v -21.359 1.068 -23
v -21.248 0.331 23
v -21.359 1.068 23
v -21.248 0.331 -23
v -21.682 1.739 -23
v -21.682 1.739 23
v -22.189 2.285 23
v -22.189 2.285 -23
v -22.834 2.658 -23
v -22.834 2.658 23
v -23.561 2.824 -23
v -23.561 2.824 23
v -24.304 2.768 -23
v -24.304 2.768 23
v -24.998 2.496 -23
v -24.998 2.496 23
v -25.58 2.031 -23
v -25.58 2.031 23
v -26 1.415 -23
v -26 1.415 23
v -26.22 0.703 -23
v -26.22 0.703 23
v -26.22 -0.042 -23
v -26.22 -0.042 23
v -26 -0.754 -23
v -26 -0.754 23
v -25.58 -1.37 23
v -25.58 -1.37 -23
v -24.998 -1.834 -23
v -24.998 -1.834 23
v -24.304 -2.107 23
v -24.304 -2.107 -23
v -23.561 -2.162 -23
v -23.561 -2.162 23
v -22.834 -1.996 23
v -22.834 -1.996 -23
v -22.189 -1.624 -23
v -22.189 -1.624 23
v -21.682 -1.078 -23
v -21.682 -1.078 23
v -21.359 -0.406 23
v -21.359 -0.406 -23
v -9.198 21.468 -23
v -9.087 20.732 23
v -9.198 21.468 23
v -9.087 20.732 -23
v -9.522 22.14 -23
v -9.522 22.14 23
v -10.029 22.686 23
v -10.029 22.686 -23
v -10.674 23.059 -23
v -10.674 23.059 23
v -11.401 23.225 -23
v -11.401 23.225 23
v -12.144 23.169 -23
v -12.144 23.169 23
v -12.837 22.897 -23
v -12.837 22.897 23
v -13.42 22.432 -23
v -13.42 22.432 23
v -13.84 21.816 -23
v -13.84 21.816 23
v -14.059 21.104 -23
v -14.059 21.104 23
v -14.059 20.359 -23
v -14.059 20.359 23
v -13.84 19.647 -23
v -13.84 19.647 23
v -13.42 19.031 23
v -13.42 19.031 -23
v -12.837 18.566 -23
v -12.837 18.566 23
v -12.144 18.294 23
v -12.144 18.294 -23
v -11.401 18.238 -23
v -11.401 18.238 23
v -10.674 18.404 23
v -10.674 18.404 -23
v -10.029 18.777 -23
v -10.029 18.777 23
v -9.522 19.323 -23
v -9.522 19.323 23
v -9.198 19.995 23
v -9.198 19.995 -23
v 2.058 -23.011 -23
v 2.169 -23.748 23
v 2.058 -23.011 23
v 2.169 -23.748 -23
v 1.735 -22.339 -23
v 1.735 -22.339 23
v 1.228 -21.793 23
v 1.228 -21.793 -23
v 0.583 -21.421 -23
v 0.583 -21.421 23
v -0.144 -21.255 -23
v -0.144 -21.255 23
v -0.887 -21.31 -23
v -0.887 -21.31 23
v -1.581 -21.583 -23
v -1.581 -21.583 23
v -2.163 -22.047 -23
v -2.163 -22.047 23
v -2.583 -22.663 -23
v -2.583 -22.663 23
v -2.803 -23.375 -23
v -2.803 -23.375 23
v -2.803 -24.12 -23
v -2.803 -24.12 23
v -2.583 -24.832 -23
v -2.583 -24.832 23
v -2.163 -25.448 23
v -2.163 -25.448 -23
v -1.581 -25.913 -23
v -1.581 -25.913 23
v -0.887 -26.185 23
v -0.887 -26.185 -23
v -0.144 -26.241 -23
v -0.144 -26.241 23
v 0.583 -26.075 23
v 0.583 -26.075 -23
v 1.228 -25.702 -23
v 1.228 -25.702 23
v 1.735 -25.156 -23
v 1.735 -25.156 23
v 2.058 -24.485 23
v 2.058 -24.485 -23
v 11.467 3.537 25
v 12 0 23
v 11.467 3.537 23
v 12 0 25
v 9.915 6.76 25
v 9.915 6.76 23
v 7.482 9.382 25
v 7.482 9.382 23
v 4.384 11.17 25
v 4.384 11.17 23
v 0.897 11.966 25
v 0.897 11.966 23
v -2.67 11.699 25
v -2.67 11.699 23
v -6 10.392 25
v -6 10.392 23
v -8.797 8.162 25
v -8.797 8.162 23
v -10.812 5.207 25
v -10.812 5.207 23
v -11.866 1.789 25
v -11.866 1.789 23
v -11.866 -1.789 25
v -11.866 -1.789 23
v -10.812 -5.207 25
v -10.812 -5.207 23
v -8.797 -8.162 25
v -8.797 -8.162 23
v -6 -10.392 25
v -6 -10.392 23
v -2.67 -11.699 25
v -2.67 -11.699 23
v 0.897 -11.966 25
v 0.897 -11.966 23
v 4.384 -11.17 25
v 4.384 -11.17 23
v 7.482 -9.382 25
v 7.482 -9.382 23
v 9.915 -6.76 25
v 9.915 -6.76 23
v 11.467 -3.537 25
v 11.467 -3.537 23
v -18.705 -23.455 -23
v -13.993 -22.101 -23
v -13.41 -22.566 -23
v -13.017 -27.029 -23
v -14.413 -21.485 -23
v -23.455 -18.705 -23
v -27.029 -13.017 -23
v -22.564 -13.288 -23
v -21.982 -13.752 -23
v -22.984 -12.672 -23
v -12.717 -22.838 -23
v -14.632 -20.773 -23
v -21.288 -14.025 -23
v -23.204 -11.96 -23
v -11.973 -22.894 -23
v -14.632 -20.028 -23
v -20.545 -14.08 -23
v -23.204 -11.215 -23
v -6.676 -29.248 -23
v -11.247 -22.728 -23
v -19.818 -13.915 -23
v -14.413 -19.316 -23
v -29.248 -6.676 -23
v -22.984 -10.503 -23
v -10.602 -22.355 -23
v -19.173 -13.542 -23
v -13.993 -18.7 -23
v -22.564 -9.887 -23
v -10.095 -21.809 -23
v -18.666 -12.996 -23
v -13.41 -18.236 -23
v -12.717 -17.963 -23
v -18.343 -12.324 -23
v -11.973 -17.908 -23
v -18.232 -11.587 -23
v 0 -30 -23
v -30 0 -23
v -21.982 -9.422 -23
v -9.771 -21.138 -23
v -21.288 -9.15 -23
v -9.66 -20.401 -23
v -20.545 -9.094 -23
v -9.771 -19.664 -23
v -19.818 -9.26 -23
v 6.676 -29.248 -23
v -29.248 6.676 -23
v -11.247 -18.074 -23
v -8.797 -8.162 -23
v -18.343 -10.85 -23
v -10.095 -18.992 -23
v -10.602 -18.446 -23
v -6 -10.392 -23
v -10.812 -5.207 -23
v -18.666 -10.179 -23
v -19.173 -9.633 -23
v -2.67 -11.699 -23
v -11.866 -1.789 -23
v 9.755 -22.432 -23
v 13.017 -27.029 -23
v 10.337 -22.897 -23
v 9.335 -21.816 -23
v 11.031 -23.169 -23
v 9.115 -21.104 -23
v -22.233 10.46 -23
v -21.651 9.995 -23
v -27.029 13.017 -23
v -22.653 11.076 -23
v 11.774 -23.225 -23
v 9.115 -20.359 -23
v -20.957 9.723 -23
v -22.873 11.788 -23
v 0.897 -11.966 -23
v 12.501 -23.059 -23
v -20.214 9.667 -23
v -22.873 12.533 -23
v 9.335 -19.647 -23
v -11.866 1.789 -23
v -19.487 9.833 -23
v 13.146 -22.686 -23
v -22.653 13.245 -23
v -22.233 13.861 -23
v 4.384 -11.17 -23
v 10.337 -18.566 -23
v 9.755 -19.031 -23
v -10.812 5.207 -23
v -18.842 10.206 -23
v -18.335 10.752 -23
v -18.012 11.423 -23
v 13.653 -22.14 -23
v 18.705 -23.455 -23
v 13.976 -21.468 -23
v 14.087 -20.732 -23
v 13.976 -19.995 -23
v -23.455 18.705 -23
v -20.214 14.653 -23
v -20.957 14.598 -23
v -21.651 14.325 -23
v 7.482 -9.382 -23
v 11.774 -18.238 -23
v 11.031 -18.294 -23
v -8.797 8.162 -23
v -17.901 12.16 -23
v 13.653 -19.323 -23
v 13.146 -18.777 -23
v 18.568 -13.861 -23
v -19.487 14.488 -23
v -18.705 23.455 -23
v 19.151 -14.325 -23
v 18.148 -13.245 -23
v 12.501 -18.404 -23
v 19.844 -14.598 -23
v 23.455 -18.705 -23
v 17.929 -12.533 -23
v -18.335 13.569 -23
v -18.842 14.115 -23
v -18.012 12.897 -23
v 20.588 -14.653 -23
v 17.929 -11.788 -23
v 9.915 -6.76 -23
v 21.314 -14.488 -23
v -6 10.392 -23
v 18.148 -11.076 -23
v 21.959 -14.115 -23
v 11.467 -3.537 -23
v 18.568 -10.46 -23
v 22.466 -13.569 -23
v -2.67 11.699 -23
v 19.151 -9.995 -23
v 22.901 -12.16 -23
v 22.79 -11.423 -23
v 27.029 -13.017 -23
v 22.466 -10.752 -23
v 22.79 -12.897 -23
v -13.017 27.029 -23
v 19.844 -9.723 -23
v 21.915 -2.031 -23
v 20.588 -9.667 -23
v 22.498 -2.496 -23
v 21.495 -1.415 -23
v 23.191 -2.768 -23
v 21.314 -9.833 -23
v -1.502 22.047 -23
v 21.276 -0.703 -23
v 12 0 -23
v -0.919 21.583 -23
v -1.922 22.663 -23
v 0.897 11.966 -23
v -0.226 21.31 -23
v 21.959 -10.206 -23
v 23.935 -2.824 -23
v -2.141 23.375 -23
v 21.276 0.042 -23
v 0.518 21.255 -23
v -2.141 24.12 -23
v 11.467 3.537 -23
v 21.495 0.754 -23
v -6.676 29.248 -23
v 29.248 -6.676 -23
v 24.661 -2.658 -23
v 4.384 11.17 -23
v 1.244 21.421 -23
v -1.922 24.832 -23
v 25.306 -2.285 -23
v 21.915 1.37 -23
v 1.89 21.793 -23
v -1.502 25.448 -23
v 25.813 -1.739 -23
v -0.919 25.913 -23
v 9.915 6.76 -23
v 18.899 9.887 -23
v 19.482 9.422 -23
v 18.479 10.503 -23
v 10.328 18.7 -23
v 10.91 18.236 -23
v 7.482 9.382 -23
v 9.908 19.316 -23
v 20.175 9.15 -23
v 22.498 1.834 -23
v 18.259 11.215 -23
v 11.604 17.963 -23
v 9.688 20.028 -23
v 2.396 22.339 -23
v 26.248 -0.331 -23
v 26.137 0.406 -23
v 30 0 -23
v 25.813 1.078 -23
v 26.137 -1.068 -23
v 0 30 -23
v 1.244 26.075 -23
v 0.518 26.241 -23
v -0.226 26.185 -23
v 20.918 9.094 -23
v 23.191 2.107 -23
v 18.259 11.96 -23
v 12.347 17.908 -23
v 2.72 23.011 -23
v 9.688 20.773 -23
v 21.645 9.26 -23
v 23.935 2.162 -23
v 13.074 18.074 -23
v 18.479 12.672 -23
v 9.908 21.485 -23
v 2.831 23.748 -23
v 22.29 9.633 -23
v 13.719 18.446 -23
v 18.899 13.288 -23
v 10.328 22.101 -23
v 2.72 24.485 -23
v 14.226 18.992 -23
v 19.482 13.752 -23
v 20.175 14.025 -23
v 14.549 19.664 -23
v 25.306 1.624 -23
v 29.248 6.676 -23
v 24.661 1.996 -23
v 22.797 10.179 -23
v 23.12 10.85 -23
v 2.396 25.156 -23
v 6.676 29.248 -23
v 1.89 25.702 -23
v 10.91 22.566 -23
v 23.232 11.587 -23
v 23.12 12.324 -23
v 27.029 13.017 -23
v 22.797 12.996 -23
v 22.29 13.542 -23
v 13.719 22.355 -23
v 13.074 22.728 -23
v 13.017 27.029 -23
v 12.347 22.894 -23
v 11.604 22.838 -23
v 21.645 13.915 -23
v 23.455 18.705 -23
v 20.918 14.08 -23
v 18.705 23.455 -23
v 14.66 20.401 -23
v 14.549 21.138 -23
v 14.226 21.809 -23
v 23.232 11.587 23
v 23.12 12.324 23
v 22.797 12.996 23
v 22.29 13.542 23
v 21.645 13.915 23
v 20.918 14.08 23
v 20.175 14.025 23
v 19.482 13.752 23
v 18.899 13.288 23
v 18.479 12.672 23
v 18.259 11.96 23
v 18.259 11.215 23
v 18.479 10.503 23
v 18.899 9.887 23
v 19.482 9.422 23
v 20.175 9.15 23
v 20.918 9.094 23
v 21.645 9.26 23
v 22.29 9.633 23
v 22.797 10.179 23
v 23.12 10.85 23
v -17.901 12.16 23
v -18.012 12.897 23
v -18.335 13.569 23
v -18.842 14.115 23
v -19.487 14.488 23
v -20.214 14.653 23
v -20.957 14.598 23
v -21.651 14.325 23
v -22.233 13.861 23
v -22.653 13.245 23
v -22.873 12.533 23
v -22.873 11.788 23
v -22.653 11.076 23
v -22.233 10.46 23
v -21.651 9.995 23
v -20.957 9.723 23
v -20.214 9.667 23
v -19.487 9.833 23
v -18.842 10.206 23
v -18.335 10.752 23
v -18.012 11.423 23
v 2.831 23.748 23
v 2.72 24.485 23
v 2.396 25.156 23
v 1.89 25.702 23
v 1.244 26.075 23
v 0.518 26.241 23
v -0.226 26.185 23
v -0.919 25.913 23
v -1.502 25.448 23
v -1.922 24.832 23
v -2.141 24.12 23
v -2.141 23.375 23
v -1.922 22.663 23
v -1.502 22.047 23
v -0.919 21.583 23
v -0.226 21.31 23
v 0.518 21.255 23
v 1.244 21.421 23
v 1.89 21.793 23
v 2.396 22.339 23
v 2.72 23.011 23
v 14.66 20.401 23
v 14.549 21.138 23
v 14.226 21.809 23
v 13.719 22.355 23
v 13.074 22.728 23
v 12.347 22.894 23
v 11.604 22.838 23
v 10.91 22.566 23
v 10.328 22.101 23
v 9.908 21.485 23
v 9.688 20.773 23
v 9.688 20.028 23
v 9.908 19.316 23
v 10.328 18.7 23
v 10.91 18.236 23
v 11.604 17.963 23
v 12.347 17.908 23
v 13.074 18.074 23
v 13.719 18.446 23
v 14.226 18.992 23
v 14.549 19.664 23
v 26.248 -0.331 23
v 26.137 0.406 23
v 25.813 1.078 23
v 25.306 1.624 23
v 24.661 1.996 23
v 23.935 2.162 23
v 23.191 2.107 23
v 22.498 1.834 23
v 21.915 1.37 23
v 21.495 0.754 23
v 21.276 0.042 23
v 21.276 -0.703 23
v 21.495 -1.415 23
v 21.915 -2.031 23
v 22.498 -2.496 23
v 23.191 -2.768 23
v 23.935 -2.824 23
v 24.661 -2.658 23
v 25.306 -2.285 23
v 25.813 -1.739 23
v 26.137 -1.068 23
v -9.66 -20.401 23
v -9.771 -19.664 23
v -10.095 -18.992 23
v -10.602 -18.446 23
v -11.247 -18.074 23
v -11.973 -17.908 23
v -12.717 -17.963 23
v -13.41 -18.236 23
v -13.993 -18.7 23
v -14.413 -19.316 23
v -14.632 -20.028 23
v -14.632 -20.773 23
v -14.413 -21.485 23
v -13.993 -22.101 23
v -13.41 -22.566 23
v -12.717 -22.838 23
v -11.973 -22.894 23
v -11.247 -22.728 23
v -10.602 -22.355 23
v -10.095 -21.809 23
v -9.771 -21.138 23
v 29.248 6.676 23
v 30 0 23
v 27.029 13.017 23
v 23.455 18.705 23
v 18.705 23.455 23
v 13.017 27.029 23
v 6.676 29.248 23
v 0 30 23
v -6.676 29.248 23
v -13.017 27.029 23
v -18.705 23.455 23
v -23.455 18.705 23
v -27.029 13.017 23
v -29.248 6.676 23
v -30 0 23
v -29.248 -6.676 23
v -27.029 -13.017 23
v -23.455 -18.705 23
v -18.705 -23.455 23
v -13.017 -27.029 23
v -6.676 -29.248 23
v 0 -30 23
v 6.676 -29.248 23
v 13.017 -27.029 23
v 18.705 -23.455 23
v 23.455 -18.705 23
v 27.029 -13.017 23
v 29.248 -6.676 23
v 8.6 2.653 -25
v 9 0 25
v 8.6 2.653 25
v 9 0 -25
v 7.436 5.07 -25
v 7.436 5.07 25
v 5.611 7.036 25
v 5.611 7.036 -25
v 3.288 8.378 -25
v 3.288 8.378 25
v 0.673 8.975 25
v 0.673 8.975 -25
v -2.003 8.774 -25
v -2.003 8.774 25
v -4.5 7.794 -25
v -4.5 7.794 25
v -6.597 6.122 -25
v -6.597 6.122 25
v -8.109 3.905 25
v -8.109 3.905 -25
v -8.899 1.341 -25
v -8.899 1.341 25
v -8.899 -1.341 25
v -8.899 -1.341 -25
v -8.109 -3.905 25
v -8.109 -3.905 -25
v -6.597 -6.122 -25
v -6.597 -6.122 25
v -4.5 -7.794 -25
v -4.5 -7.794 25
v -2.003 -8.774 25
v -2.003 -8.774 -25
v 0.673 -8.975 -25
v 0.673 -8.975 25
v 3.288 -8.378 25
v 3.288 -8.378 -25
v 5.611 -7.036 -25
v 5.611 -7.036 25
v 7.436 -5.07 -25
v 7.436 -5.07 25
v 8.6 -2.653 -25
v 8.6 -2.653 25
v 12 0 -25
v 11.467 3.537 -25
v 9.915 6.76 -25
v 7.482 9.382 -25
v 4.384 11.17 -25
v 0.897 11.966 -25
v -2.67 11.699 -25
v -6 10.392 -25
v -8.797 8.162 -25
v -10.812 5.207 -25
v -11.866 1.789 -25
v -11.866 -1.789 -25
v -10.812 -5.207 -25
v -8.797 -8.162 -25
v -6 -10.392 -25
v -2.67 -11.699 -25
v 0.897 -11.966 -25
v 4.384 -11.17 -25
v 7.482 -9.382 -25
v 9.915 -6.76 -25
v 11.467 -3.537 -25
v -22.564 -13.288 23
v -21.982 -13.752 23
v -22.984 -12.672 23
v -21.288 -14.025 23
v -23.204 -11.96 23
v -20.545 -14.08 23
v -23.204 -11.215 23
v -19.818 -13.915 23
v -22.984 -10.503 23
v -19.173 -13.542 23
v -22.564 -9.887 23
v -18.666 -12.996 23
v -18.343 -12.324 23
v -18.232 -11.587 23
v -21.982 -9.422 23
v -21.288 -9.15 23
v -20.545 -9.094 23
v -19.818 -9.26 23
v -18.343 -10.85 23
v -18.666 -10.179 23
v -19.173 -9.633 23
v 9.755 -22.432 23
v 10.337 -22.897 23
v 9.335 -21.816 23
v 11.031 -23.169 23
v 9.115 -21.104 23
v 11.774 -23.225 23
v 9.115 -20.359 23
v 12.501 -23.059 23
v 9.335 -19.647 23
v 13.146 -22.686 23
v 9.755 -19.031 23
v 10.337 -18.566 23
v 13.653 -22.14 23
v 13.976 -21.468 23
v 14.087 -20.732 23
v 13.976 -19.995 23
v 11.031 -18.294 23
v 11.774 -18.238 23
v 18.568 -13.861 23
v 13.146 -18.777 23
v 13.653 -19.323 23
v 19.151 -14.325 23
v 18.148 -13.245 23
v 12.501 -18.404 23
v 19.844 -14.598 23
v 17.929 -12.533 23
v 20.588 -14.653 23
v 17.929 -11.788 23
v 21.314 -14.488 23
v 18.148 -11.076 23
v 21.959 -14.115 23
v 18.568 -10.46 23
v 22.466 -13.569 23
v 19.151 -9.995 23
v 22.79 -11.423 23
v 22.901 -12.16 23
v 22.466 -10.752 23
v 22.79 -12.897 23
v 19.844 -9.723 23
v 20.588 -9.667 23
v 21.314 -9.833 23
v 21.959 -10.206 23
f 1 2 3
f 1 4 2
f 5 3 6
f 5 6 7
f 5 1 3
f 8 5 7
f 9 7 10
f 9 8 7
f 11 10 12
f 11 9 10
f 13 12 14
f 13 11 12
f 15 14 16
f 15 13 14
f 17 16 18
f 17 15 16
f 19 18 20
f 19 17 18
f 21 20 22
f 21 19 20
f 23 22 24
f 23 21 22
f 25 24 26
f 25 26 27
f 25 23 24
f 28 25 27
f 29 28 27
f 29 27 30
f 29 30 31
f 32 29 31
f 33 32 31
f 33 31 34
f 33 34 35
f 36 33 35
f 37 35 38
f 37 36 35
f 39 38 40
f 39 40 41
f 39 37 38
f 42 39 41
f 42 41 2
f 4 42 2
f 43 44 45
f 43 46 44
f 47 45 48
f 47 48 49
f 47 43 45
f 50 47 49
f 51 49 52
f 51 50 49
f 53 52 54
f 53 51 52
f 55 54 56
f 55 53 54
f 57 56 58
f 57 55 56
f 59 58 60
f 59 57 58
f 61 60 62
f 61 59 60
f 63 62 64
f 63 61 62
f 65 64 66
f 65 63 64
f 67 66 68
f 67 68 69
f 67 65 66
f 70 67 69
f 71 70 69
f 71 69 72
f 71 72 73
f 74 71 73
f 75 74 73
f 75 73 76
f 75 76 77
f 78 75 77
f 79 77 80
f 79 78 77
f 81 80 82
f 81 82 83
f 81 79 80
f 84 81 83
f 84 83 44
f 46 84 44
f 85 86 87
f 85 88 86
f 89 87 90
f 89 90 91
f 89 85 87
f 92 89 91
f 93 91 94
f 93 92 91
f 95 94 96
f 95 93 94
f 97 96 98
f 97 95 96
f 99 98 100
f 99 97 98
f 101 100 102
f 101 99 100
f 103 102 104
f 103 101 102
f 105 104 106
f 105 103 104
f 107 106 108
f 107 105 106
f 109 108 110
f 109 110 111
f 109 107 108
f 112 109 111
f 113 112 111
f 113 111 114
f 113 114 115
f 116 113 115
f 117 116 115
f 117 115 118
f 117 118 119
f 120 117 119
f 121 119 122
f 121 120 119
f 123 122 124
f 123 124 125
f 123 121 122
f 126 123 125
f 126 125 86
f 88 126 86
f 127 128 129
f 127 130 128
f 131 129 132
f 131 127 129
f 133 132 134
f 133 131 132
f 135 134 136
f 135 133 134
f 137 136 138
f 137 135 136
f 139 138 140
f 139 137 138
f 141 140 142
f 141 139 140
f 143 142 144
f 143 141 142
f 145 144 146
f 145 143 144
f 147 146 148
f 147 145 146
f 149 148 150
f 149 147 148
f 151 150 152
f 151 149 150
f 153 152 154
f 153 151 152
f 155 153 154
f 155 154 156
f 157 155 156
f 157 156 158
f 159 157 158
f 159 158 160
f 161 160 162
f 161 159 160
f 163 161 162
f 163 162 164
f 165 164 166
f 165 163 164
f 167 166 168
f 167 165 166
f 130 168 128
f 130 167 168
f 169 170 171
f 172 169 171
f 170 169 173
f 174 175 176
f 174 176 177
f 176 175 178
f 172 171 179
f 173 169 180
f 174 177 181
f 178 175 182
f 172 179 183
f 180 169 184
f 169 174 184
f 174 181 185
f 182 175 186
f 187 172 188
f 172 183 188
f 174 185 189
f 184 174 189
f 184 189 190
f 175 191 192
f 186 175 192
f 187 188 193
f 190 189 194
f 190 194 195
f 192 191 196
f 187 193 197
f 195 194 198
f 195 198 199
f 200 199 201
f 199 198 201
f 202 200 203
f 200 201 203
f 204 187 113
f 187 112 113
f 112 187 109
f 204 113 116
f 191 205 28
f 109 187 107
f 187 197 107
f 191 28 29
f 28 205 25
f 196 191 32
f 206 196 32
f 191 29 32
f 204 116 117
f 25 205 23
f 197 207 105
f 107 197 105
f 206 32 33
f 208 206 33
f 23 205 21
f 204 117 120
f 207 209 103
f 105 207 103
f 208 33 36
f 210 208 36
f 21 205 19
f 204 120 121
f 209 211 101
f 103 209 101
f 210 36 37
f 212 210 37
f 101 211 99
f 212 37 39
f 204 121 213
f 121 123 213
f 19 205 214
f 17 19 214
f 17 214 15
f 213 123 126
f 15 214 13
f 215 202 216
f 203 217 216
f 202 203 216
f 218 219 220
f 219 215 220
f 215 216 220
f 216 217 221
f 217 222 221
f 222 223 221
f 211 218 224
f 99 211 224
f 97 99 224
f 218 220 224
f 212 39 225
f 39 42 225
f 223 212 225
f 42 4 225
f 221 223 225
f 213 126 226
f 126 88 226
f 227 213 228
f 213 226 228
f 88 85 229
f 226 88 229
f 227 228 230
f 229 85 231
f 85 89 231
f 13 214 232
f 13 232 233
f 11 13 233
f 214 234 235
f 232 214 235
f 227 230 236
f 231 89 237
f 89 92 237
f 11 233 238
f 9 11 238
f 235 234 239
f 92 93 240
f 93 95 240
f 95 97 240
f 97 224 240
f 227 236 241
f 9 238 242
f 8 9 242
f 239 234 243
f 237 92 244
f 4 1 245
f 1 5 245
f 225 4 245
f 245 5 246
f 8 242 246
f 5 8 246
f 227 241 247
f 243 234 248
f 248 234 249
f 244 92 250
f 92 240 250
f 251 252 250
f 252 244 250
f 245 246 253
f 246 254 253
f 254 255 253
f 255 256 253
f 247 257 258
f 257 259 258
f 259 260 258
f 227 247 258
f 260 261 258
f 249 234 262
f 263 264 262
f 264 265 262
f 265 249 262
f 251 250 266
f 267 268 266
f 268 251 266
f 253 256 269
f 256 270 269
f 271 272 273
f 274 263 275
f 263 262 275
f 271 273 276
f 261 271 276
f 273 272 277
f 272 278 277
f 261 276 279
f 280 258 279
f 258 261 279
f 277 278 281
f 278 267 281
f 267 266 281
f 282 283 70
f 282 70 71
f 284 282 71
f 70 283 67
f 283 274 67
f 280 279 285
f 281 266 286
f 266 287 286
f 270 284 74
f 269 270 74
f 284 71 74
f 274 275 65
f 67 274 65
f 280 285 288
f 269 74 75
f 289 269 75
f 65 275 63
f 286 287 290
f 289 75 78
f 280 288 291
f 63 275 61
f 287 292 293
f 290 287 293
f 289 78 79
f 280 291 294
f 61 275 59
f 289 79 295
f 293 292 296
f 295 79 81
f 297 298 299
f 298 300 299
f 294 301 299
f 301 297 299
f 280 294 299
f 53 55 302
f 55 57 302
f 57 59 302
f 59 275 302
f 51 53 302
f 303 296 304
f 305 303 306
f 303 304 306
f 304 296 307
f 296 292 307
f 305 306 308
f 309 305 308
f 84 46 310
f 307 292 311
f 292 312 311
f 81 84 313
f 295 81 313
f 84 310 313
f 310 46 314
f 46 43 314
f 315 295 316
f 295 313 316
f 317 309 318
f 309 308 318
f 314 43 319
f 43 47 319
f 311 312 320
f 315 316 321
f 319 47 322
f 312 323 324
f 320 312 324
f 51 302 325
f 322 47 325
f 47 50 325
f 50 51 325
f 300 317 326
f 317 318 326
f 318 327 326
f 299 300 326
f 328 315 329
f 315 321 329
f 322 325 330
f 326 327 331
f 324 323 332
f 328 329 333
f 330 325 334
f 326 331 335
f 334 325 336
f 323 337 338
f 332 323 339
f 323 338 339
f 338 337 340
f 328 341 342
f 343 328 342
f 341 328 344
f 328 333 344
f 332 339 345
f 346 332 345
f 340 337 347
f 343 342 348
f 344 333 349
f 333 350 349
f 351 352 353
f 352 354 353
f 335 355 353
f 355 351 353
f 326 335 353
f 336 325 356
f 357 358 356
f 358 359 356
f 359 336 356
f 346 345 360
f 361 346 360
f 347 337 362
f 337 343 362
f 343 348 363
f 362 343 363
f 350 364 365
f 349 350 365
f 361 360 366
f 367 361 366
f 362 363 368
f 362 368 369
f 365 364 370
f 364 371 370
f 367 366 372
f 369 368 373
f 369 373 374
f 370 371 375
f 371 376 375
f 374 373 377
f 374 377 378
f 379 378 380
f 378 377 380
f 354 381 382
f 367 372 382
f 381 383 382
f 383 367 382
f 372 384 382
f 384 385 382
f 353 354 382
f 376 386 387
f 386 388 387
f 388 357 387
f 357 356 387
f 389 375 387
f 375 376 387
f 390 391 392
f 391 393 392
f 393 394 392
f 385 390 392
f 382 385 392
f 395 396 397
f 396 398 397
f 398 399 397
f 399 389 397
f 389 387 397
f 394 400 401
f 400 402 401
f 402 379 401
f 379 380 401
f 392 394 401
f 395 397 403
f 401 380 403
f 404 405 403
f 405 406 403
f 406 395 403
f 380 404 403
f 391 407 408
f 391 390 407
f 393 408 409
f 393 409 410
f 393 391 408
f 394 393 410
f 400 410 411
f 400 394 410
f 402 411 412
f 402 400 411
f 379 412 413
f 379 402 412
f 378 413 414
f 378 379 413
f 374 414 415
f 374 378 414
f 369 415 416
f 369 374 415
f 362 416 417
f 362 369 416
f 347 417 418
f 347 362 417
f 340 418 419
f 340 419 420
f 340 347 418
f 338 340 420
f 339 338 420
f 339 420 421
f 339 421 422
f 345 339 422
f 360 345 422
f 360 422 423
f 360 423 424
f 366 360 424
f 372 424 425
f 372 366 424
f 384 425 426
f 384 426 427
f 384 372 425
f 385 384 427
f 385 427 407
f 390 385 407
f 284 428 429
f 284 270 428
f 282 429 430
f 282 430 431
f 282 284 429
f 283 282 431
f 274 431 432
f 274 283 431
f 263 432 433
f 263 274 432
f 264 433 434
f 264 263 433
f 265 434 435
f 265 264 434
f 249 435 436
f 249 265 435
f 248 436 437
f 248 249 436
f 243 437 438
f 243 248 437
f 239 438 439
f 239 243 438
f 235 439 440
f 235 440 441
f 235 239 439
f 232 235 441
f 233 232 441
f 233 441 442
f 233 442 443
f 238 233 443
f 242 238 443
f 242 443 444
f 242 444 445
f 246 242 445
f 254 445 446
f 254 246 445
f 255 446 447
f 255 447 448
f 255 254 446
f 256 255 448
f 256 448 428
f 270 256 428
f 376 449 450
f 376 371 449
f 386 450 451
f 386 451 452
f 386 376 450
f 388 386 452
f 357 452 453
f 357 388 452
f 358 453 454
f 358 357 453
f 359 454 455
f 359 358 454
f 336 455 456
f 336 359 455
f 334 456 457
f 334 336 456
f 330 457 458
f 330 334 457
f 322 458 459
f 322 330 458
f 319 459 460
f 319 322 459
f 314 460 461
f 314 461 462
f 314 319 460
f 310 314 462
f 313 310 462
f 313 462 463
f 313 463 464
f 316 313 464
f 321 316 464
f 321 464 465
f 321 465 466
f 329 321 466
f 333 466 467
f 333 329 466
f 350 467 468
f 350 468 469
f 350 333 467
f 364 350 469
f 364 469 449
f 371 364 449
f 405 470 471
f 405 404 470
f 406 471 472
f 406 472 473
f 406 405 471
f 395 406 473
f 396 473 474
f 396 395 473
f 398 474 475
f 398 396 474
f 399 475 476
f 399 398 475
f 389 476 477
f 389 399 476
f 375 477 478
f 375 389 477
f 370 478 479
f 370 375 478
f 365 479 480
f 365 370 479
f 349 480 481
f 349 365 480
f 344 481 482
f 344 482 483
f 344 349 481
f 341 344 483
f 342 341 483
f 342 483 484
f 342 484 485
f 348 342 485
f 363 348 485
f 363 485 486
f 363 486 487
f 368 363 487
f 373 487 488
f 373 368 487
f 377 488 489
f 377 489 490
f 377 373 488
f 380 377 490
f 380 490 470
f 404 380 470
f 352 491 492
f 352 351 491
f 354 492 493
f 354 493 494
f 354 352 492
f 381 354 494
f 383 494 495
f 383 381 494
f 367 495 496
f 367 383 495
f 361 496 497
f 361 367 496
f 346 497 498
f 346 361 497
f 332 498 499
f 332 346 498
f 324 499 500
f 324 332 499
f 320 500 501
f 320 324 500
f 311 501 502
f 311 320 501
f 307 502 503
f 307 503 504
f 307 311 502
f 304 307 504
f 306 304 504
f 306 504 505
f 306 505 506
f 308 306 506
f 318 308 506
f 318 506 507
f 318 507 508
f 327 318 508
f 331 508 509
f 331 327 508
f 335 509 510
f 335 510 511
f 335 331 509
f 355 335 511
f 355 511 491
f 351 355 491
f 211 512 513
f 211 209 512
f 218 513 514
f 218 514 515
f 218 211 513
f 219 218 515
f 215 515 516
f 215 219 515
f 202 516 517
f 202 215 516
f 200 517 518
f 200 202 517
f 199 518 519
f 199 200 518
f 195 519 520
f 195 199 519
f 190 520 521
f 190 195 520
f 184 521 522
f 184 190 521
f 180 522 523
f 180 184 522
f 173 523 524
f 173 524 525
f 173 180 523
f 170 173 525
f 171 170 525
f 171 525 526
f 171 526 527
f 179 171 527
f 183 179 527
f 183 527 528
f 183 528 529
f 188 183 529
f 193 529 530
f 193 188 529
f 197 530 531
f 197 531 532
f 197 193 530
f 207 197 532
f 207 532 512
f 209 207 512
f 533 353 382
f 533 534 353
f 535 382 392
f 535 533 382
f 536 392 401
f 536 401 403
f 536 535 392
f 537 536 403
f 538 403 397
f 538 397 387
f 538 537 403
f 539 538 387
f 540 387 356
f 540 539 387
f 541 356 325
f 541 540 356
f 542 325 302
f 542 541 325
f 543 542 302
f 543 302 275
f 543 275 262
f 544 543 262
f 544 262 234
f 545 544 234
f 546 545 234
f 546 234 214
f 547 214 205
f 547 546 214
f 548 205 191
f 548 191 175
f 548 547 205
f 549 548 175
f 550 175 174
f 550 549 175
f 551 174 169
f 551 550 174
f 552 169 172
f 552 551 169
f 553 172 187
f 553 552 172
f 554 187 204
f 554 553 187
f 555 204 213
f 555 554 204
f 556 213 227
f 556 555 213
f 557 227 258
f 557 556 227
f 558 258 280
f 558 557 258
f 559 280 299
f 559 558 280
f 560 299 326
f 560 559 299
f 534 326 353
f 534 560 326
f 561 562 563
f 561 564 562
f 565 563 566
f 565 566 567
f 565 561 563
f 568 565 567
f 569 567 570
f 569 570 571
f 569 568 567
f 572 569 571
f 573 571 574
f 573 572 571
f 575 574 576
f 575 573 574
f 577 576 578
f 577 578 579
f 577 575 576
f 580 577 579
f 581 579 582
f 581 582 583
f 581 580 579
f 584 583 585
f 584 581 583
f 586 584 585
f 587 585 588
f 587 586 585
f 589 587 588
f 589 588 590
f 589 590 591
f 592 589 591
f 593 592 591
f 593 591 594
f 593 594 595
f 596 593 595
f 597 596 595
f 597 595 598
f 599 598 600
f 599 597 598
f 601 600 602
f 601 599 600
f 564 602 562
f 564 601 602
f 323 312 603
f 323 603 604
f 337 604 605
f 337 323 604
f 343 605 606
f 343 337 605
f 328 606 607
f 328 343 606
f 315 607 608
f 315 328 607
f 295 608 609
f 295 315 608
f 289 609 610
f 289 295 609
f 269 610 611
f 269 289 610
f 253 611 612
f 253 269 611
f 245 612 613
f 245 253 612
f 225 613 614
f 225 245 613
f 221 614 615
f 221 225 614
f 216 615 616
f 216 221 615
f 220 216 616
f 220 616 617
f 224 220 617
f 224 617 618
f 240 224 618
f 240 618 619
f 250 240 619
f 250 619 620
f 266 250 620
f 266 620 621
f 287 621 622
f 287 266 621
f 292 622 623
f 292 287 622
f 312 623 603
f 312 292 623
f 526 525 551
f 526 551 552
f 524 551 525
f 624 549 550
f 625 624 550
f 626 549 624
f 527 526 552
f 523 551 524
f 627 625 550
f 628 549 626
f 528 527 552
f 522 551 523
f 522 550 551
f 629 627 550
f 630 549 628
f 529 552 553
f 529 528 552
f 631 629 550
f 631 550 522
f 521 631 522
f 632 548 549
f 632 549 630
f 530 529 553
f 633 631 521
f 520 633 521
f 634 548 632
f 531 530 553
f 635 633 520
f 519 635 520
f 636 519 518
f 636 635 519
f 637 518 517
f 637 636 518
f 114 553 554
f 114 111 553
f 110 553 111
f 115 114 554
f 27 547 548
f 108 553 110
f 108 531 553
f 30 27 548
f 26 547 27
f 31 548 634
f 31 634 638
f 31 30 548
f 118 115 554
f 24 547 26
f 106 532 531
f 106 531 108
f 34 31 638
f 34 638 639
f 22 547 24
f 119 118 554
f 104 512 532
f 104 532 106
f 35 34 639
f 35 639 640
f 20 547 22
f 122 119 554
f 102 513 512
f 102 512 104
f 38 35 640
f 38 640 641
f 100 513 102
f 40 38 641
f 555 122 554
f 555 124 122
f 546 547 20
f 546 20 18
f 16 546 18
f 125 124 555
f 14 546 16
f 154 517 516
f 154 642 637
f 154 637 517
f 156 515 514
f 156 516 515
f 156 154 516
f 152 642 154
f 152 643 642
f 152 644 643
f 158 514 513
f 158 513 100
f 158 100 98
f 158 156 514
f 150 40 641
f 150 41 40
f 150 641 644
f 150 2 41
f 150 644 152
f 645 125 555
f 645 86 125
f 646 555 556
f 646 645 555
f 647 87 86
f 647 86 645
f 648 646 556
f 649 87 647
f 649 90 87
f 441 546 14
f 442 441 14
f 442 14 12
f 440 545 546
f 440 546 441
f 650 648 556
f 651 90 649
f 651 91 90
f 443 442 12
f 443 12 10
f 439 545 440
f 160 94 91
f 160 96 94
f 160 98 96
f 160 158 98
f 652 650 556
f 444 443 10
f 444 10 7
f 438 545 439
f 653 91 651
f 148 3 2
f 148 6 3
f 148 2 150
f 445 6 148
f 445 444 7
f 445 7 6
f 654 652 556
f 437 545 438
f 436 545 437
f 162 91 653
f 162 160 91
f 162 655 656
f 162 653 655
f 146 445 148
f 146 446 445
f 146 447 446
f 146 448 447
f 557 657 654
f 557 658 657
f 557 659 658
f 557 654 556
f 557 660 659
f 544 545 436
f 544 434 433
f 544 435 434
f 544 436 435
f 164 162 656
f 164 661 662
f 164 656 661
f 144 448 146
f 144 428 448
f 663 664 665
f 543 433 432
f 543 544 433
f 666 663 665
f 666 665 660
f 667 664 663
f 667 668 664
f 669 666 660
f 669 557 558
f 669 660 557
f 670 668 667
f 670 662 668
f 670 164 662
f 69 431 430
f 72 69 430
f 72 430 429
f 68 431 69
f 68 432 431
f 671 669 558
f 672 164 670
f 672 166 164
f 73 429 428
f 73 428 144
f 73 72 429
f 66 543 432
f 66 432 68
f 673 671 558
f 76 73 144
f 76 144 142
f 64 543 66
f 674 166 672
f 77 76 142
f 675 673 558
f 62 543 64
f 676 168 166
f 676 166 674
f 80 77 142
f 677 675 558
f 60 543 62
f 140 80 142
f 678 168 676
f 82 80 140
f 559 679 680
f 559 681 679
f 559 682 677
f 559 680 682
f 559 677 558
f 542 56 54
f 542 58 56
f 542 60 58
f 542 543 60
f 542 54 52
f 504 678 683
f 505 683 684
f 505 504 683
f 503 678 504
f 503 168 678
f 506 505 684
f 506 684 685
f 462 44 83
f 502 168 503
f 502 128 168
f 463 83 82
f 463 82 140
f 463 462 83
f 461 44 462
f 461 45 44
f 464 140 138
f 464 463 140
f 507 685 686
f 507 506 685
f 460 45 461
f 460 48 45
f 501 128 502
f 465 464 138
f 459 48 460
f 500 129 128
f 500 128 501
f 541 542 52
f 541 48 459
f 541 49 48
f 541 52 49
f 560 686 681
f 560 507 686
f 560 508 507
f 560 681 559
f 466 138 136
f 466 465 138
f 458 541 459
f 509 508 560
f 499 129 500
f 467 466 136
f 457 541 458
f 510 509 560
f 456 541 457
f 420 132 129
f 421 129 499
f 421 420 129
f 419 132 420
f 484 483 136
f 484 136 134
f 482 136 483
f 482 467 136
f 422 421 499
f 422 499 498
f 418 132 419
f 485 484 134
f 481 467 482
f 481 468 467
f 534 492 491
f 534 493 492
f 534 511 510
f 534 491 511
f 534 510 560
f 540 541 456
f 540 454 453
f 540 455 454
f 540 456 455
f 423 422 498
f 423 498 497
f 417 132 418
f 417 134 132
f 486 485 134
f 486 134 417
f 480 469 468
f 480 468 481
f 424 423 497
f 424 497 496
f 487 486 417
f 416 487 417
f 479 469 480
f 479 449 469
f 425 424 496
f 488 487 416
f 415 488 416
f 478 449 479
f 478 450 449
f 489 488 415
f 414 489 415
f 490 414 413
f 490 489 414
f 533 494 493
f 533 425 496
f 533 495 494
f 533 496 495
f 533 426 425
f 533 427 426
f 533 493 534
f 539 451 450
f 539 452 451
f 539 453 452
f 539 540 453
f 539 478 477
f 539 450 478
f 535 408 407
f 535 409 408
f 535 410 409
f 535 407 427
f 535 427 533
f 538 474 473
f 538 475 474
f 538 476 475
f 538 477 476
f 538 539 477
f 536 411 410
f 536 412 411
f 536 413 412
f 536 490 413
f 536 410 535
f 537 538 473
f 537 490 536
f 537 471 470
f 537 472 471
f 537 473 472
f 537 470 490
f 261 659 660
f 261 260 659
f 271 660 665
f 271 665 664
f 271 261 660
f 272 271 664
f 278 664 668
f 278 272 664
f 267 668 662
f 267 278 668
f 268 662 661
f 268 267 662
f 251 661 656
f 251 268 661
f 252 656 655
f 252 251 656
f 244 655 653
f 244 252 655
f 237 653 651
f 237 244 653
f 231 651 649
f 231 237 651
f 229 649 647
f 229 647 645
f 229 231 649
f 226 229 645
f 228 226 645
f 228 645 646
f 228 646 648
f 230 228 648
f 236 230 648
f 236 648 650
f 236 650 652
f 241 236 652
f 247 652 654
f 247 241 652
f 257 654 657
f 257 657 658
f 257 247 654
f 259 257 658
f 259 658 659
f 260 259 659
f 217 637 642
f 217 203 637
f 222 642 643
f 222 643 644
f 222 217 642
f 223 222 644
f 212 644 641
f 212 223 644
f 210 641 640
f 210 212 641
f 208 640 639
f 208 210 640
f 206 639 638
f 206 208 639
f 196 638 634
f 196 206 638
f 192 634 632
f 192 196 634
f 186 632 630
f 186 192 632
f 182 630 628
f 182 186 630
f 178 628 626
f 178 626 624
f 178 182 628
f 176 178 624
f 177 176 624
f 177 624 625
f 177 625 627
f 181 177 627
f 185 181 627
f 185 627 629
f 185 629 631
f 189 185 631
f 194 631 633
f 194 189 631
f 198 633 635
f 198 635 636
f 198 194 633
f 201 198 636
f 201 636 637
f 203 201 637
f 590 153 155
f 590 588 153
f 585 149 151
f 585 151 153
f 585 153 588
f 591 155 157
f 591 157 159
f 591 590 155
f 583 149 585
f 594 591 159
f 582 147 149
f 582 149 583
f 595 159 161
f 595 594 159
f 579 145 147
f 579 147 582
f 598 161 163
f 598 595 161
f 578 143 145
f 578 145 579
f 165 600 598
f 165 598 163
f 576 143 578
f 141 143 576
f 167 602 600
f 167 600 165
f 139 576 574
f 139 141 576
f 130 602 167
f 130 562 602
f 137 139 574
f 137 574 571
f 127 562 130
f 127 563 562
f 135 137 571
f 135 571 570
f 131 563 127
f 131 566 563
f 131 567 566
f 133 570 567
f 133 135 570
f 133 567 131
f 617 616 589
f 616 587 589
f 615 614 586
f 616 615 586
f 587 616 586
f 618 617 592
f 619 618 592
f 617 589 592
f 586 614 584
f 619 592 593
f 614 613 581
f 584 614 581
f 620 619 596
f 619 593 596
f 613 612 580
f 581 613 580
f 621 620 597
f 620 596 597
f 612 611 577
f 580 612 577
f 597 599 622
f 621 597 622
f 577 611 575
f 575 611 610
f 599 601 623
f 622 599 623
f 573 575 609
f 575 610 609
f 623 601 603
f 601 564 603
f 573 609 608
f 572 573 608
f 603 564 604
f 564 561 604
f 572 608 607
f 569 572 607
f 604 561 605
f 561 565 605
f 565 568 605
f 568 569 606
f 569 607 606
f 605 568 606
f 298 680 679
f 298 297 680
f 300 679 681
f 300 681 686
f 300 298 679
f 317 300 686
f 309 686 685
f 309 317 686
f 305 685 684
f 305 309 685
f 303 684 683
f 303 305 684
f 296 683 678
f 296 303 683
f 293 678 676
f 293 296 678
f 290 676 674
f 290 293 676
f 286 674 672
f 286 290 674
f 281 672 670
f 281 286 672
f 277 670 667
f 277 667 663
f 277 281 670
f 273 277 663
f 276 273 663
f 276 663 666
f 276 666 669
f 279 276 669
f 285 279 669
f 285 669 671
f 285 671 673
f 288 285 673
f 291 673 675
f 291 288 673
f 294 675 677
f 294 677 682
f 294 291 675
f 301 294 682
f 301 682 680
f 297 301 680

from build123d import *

# Parameters (mm, degrees)
SKETCH1_R           = 30
SKETCH1_R_2         = 12
SKETCH1_R_3         = 2.5
BOSS_EXTRUDE1_DEPTH = 23
SKETCH2_R           = 12
SKETCH2_R_2         = 9
BOSS_EXTRUDE2_DEPTH = 25


with BuildPart() as part:
    # Sketch1 → Boss-Extrude1 (new body, symmetric)
    with BuildSketch(Plane.XY):
        Circle(SKETCH1_R)
        Circle(SKETCH1_R_2, mode=Mode.SUBTRACT)
        with Locations((0.330787081, 23.747696307)):
            Circle(SKETCH1_R_3, mode=Mode.SUBTRACT)
        with Locations((12.160318169, 20.400714743)):
            Circle(SKETCH1_R_3, mode=Mode.SUBTRACT)
        with Locations((20.731501824, 11.587378139)):
            Circle(SKETCH1_R_3, mode=Mode.SUBTRACT)
        with Locations((23.747696307, -0.330787081)):
            Circle(SKETCH1_R_3, mode=Mode.SUBTRACT)
        with Locations((20.400714743, -12.160318169)):
            Circle(SKETCH1_R_3, mode=Mode.SUBTRACT)
        with Locations((11.587378139, -20.731501824)):
            Circle(SKETCH1_R_3, mode=Mode.SUBTRACT)
        with Locations((-0.330787081, -23.747696307)):
            Circle(SKETCH1_R_3, mode=Mode.SUBTRACT)
        with Locations((-12.160318169, -20.400714743)):
            Circle(SKETCH1_R_3, mode=Mode.SUBTRACT)
        with Locations((-20.731501824, -11.587378139)):
            Circle(SKETCH1_R_3, mode=Mode.SUBTRACT)
        with Locations((-23.747696307, 0.330787081)):
            Circle(SKETCH1_R_3, mode=Mode.SUBTRACT)
        with Locations((-20.400714743, 12.160318169)):
            Circle(SKETCH1_R_3, mode=Mode.SUBTRACT)
        with Locations((-11.587378139, 20.731501824)):
            Circle(SKETCH1_R_3, mode=Mode.SUBTRACT)
    extrude(amount=BOSS_EXTRUDE1_DEPTH, both=True)

    # Sketch2 → Boss-Extrude2 (add, symmetric)
    with BuildSketch(Plane.XY):
        Circle(SKETCH2_R)
        Circle(SKETCH2_R_2, mode=Mode.SUBTRACT)
    extrude(amount=BOSS_EXTRUDE2_DEPTH, both=True)


solid = part.part
